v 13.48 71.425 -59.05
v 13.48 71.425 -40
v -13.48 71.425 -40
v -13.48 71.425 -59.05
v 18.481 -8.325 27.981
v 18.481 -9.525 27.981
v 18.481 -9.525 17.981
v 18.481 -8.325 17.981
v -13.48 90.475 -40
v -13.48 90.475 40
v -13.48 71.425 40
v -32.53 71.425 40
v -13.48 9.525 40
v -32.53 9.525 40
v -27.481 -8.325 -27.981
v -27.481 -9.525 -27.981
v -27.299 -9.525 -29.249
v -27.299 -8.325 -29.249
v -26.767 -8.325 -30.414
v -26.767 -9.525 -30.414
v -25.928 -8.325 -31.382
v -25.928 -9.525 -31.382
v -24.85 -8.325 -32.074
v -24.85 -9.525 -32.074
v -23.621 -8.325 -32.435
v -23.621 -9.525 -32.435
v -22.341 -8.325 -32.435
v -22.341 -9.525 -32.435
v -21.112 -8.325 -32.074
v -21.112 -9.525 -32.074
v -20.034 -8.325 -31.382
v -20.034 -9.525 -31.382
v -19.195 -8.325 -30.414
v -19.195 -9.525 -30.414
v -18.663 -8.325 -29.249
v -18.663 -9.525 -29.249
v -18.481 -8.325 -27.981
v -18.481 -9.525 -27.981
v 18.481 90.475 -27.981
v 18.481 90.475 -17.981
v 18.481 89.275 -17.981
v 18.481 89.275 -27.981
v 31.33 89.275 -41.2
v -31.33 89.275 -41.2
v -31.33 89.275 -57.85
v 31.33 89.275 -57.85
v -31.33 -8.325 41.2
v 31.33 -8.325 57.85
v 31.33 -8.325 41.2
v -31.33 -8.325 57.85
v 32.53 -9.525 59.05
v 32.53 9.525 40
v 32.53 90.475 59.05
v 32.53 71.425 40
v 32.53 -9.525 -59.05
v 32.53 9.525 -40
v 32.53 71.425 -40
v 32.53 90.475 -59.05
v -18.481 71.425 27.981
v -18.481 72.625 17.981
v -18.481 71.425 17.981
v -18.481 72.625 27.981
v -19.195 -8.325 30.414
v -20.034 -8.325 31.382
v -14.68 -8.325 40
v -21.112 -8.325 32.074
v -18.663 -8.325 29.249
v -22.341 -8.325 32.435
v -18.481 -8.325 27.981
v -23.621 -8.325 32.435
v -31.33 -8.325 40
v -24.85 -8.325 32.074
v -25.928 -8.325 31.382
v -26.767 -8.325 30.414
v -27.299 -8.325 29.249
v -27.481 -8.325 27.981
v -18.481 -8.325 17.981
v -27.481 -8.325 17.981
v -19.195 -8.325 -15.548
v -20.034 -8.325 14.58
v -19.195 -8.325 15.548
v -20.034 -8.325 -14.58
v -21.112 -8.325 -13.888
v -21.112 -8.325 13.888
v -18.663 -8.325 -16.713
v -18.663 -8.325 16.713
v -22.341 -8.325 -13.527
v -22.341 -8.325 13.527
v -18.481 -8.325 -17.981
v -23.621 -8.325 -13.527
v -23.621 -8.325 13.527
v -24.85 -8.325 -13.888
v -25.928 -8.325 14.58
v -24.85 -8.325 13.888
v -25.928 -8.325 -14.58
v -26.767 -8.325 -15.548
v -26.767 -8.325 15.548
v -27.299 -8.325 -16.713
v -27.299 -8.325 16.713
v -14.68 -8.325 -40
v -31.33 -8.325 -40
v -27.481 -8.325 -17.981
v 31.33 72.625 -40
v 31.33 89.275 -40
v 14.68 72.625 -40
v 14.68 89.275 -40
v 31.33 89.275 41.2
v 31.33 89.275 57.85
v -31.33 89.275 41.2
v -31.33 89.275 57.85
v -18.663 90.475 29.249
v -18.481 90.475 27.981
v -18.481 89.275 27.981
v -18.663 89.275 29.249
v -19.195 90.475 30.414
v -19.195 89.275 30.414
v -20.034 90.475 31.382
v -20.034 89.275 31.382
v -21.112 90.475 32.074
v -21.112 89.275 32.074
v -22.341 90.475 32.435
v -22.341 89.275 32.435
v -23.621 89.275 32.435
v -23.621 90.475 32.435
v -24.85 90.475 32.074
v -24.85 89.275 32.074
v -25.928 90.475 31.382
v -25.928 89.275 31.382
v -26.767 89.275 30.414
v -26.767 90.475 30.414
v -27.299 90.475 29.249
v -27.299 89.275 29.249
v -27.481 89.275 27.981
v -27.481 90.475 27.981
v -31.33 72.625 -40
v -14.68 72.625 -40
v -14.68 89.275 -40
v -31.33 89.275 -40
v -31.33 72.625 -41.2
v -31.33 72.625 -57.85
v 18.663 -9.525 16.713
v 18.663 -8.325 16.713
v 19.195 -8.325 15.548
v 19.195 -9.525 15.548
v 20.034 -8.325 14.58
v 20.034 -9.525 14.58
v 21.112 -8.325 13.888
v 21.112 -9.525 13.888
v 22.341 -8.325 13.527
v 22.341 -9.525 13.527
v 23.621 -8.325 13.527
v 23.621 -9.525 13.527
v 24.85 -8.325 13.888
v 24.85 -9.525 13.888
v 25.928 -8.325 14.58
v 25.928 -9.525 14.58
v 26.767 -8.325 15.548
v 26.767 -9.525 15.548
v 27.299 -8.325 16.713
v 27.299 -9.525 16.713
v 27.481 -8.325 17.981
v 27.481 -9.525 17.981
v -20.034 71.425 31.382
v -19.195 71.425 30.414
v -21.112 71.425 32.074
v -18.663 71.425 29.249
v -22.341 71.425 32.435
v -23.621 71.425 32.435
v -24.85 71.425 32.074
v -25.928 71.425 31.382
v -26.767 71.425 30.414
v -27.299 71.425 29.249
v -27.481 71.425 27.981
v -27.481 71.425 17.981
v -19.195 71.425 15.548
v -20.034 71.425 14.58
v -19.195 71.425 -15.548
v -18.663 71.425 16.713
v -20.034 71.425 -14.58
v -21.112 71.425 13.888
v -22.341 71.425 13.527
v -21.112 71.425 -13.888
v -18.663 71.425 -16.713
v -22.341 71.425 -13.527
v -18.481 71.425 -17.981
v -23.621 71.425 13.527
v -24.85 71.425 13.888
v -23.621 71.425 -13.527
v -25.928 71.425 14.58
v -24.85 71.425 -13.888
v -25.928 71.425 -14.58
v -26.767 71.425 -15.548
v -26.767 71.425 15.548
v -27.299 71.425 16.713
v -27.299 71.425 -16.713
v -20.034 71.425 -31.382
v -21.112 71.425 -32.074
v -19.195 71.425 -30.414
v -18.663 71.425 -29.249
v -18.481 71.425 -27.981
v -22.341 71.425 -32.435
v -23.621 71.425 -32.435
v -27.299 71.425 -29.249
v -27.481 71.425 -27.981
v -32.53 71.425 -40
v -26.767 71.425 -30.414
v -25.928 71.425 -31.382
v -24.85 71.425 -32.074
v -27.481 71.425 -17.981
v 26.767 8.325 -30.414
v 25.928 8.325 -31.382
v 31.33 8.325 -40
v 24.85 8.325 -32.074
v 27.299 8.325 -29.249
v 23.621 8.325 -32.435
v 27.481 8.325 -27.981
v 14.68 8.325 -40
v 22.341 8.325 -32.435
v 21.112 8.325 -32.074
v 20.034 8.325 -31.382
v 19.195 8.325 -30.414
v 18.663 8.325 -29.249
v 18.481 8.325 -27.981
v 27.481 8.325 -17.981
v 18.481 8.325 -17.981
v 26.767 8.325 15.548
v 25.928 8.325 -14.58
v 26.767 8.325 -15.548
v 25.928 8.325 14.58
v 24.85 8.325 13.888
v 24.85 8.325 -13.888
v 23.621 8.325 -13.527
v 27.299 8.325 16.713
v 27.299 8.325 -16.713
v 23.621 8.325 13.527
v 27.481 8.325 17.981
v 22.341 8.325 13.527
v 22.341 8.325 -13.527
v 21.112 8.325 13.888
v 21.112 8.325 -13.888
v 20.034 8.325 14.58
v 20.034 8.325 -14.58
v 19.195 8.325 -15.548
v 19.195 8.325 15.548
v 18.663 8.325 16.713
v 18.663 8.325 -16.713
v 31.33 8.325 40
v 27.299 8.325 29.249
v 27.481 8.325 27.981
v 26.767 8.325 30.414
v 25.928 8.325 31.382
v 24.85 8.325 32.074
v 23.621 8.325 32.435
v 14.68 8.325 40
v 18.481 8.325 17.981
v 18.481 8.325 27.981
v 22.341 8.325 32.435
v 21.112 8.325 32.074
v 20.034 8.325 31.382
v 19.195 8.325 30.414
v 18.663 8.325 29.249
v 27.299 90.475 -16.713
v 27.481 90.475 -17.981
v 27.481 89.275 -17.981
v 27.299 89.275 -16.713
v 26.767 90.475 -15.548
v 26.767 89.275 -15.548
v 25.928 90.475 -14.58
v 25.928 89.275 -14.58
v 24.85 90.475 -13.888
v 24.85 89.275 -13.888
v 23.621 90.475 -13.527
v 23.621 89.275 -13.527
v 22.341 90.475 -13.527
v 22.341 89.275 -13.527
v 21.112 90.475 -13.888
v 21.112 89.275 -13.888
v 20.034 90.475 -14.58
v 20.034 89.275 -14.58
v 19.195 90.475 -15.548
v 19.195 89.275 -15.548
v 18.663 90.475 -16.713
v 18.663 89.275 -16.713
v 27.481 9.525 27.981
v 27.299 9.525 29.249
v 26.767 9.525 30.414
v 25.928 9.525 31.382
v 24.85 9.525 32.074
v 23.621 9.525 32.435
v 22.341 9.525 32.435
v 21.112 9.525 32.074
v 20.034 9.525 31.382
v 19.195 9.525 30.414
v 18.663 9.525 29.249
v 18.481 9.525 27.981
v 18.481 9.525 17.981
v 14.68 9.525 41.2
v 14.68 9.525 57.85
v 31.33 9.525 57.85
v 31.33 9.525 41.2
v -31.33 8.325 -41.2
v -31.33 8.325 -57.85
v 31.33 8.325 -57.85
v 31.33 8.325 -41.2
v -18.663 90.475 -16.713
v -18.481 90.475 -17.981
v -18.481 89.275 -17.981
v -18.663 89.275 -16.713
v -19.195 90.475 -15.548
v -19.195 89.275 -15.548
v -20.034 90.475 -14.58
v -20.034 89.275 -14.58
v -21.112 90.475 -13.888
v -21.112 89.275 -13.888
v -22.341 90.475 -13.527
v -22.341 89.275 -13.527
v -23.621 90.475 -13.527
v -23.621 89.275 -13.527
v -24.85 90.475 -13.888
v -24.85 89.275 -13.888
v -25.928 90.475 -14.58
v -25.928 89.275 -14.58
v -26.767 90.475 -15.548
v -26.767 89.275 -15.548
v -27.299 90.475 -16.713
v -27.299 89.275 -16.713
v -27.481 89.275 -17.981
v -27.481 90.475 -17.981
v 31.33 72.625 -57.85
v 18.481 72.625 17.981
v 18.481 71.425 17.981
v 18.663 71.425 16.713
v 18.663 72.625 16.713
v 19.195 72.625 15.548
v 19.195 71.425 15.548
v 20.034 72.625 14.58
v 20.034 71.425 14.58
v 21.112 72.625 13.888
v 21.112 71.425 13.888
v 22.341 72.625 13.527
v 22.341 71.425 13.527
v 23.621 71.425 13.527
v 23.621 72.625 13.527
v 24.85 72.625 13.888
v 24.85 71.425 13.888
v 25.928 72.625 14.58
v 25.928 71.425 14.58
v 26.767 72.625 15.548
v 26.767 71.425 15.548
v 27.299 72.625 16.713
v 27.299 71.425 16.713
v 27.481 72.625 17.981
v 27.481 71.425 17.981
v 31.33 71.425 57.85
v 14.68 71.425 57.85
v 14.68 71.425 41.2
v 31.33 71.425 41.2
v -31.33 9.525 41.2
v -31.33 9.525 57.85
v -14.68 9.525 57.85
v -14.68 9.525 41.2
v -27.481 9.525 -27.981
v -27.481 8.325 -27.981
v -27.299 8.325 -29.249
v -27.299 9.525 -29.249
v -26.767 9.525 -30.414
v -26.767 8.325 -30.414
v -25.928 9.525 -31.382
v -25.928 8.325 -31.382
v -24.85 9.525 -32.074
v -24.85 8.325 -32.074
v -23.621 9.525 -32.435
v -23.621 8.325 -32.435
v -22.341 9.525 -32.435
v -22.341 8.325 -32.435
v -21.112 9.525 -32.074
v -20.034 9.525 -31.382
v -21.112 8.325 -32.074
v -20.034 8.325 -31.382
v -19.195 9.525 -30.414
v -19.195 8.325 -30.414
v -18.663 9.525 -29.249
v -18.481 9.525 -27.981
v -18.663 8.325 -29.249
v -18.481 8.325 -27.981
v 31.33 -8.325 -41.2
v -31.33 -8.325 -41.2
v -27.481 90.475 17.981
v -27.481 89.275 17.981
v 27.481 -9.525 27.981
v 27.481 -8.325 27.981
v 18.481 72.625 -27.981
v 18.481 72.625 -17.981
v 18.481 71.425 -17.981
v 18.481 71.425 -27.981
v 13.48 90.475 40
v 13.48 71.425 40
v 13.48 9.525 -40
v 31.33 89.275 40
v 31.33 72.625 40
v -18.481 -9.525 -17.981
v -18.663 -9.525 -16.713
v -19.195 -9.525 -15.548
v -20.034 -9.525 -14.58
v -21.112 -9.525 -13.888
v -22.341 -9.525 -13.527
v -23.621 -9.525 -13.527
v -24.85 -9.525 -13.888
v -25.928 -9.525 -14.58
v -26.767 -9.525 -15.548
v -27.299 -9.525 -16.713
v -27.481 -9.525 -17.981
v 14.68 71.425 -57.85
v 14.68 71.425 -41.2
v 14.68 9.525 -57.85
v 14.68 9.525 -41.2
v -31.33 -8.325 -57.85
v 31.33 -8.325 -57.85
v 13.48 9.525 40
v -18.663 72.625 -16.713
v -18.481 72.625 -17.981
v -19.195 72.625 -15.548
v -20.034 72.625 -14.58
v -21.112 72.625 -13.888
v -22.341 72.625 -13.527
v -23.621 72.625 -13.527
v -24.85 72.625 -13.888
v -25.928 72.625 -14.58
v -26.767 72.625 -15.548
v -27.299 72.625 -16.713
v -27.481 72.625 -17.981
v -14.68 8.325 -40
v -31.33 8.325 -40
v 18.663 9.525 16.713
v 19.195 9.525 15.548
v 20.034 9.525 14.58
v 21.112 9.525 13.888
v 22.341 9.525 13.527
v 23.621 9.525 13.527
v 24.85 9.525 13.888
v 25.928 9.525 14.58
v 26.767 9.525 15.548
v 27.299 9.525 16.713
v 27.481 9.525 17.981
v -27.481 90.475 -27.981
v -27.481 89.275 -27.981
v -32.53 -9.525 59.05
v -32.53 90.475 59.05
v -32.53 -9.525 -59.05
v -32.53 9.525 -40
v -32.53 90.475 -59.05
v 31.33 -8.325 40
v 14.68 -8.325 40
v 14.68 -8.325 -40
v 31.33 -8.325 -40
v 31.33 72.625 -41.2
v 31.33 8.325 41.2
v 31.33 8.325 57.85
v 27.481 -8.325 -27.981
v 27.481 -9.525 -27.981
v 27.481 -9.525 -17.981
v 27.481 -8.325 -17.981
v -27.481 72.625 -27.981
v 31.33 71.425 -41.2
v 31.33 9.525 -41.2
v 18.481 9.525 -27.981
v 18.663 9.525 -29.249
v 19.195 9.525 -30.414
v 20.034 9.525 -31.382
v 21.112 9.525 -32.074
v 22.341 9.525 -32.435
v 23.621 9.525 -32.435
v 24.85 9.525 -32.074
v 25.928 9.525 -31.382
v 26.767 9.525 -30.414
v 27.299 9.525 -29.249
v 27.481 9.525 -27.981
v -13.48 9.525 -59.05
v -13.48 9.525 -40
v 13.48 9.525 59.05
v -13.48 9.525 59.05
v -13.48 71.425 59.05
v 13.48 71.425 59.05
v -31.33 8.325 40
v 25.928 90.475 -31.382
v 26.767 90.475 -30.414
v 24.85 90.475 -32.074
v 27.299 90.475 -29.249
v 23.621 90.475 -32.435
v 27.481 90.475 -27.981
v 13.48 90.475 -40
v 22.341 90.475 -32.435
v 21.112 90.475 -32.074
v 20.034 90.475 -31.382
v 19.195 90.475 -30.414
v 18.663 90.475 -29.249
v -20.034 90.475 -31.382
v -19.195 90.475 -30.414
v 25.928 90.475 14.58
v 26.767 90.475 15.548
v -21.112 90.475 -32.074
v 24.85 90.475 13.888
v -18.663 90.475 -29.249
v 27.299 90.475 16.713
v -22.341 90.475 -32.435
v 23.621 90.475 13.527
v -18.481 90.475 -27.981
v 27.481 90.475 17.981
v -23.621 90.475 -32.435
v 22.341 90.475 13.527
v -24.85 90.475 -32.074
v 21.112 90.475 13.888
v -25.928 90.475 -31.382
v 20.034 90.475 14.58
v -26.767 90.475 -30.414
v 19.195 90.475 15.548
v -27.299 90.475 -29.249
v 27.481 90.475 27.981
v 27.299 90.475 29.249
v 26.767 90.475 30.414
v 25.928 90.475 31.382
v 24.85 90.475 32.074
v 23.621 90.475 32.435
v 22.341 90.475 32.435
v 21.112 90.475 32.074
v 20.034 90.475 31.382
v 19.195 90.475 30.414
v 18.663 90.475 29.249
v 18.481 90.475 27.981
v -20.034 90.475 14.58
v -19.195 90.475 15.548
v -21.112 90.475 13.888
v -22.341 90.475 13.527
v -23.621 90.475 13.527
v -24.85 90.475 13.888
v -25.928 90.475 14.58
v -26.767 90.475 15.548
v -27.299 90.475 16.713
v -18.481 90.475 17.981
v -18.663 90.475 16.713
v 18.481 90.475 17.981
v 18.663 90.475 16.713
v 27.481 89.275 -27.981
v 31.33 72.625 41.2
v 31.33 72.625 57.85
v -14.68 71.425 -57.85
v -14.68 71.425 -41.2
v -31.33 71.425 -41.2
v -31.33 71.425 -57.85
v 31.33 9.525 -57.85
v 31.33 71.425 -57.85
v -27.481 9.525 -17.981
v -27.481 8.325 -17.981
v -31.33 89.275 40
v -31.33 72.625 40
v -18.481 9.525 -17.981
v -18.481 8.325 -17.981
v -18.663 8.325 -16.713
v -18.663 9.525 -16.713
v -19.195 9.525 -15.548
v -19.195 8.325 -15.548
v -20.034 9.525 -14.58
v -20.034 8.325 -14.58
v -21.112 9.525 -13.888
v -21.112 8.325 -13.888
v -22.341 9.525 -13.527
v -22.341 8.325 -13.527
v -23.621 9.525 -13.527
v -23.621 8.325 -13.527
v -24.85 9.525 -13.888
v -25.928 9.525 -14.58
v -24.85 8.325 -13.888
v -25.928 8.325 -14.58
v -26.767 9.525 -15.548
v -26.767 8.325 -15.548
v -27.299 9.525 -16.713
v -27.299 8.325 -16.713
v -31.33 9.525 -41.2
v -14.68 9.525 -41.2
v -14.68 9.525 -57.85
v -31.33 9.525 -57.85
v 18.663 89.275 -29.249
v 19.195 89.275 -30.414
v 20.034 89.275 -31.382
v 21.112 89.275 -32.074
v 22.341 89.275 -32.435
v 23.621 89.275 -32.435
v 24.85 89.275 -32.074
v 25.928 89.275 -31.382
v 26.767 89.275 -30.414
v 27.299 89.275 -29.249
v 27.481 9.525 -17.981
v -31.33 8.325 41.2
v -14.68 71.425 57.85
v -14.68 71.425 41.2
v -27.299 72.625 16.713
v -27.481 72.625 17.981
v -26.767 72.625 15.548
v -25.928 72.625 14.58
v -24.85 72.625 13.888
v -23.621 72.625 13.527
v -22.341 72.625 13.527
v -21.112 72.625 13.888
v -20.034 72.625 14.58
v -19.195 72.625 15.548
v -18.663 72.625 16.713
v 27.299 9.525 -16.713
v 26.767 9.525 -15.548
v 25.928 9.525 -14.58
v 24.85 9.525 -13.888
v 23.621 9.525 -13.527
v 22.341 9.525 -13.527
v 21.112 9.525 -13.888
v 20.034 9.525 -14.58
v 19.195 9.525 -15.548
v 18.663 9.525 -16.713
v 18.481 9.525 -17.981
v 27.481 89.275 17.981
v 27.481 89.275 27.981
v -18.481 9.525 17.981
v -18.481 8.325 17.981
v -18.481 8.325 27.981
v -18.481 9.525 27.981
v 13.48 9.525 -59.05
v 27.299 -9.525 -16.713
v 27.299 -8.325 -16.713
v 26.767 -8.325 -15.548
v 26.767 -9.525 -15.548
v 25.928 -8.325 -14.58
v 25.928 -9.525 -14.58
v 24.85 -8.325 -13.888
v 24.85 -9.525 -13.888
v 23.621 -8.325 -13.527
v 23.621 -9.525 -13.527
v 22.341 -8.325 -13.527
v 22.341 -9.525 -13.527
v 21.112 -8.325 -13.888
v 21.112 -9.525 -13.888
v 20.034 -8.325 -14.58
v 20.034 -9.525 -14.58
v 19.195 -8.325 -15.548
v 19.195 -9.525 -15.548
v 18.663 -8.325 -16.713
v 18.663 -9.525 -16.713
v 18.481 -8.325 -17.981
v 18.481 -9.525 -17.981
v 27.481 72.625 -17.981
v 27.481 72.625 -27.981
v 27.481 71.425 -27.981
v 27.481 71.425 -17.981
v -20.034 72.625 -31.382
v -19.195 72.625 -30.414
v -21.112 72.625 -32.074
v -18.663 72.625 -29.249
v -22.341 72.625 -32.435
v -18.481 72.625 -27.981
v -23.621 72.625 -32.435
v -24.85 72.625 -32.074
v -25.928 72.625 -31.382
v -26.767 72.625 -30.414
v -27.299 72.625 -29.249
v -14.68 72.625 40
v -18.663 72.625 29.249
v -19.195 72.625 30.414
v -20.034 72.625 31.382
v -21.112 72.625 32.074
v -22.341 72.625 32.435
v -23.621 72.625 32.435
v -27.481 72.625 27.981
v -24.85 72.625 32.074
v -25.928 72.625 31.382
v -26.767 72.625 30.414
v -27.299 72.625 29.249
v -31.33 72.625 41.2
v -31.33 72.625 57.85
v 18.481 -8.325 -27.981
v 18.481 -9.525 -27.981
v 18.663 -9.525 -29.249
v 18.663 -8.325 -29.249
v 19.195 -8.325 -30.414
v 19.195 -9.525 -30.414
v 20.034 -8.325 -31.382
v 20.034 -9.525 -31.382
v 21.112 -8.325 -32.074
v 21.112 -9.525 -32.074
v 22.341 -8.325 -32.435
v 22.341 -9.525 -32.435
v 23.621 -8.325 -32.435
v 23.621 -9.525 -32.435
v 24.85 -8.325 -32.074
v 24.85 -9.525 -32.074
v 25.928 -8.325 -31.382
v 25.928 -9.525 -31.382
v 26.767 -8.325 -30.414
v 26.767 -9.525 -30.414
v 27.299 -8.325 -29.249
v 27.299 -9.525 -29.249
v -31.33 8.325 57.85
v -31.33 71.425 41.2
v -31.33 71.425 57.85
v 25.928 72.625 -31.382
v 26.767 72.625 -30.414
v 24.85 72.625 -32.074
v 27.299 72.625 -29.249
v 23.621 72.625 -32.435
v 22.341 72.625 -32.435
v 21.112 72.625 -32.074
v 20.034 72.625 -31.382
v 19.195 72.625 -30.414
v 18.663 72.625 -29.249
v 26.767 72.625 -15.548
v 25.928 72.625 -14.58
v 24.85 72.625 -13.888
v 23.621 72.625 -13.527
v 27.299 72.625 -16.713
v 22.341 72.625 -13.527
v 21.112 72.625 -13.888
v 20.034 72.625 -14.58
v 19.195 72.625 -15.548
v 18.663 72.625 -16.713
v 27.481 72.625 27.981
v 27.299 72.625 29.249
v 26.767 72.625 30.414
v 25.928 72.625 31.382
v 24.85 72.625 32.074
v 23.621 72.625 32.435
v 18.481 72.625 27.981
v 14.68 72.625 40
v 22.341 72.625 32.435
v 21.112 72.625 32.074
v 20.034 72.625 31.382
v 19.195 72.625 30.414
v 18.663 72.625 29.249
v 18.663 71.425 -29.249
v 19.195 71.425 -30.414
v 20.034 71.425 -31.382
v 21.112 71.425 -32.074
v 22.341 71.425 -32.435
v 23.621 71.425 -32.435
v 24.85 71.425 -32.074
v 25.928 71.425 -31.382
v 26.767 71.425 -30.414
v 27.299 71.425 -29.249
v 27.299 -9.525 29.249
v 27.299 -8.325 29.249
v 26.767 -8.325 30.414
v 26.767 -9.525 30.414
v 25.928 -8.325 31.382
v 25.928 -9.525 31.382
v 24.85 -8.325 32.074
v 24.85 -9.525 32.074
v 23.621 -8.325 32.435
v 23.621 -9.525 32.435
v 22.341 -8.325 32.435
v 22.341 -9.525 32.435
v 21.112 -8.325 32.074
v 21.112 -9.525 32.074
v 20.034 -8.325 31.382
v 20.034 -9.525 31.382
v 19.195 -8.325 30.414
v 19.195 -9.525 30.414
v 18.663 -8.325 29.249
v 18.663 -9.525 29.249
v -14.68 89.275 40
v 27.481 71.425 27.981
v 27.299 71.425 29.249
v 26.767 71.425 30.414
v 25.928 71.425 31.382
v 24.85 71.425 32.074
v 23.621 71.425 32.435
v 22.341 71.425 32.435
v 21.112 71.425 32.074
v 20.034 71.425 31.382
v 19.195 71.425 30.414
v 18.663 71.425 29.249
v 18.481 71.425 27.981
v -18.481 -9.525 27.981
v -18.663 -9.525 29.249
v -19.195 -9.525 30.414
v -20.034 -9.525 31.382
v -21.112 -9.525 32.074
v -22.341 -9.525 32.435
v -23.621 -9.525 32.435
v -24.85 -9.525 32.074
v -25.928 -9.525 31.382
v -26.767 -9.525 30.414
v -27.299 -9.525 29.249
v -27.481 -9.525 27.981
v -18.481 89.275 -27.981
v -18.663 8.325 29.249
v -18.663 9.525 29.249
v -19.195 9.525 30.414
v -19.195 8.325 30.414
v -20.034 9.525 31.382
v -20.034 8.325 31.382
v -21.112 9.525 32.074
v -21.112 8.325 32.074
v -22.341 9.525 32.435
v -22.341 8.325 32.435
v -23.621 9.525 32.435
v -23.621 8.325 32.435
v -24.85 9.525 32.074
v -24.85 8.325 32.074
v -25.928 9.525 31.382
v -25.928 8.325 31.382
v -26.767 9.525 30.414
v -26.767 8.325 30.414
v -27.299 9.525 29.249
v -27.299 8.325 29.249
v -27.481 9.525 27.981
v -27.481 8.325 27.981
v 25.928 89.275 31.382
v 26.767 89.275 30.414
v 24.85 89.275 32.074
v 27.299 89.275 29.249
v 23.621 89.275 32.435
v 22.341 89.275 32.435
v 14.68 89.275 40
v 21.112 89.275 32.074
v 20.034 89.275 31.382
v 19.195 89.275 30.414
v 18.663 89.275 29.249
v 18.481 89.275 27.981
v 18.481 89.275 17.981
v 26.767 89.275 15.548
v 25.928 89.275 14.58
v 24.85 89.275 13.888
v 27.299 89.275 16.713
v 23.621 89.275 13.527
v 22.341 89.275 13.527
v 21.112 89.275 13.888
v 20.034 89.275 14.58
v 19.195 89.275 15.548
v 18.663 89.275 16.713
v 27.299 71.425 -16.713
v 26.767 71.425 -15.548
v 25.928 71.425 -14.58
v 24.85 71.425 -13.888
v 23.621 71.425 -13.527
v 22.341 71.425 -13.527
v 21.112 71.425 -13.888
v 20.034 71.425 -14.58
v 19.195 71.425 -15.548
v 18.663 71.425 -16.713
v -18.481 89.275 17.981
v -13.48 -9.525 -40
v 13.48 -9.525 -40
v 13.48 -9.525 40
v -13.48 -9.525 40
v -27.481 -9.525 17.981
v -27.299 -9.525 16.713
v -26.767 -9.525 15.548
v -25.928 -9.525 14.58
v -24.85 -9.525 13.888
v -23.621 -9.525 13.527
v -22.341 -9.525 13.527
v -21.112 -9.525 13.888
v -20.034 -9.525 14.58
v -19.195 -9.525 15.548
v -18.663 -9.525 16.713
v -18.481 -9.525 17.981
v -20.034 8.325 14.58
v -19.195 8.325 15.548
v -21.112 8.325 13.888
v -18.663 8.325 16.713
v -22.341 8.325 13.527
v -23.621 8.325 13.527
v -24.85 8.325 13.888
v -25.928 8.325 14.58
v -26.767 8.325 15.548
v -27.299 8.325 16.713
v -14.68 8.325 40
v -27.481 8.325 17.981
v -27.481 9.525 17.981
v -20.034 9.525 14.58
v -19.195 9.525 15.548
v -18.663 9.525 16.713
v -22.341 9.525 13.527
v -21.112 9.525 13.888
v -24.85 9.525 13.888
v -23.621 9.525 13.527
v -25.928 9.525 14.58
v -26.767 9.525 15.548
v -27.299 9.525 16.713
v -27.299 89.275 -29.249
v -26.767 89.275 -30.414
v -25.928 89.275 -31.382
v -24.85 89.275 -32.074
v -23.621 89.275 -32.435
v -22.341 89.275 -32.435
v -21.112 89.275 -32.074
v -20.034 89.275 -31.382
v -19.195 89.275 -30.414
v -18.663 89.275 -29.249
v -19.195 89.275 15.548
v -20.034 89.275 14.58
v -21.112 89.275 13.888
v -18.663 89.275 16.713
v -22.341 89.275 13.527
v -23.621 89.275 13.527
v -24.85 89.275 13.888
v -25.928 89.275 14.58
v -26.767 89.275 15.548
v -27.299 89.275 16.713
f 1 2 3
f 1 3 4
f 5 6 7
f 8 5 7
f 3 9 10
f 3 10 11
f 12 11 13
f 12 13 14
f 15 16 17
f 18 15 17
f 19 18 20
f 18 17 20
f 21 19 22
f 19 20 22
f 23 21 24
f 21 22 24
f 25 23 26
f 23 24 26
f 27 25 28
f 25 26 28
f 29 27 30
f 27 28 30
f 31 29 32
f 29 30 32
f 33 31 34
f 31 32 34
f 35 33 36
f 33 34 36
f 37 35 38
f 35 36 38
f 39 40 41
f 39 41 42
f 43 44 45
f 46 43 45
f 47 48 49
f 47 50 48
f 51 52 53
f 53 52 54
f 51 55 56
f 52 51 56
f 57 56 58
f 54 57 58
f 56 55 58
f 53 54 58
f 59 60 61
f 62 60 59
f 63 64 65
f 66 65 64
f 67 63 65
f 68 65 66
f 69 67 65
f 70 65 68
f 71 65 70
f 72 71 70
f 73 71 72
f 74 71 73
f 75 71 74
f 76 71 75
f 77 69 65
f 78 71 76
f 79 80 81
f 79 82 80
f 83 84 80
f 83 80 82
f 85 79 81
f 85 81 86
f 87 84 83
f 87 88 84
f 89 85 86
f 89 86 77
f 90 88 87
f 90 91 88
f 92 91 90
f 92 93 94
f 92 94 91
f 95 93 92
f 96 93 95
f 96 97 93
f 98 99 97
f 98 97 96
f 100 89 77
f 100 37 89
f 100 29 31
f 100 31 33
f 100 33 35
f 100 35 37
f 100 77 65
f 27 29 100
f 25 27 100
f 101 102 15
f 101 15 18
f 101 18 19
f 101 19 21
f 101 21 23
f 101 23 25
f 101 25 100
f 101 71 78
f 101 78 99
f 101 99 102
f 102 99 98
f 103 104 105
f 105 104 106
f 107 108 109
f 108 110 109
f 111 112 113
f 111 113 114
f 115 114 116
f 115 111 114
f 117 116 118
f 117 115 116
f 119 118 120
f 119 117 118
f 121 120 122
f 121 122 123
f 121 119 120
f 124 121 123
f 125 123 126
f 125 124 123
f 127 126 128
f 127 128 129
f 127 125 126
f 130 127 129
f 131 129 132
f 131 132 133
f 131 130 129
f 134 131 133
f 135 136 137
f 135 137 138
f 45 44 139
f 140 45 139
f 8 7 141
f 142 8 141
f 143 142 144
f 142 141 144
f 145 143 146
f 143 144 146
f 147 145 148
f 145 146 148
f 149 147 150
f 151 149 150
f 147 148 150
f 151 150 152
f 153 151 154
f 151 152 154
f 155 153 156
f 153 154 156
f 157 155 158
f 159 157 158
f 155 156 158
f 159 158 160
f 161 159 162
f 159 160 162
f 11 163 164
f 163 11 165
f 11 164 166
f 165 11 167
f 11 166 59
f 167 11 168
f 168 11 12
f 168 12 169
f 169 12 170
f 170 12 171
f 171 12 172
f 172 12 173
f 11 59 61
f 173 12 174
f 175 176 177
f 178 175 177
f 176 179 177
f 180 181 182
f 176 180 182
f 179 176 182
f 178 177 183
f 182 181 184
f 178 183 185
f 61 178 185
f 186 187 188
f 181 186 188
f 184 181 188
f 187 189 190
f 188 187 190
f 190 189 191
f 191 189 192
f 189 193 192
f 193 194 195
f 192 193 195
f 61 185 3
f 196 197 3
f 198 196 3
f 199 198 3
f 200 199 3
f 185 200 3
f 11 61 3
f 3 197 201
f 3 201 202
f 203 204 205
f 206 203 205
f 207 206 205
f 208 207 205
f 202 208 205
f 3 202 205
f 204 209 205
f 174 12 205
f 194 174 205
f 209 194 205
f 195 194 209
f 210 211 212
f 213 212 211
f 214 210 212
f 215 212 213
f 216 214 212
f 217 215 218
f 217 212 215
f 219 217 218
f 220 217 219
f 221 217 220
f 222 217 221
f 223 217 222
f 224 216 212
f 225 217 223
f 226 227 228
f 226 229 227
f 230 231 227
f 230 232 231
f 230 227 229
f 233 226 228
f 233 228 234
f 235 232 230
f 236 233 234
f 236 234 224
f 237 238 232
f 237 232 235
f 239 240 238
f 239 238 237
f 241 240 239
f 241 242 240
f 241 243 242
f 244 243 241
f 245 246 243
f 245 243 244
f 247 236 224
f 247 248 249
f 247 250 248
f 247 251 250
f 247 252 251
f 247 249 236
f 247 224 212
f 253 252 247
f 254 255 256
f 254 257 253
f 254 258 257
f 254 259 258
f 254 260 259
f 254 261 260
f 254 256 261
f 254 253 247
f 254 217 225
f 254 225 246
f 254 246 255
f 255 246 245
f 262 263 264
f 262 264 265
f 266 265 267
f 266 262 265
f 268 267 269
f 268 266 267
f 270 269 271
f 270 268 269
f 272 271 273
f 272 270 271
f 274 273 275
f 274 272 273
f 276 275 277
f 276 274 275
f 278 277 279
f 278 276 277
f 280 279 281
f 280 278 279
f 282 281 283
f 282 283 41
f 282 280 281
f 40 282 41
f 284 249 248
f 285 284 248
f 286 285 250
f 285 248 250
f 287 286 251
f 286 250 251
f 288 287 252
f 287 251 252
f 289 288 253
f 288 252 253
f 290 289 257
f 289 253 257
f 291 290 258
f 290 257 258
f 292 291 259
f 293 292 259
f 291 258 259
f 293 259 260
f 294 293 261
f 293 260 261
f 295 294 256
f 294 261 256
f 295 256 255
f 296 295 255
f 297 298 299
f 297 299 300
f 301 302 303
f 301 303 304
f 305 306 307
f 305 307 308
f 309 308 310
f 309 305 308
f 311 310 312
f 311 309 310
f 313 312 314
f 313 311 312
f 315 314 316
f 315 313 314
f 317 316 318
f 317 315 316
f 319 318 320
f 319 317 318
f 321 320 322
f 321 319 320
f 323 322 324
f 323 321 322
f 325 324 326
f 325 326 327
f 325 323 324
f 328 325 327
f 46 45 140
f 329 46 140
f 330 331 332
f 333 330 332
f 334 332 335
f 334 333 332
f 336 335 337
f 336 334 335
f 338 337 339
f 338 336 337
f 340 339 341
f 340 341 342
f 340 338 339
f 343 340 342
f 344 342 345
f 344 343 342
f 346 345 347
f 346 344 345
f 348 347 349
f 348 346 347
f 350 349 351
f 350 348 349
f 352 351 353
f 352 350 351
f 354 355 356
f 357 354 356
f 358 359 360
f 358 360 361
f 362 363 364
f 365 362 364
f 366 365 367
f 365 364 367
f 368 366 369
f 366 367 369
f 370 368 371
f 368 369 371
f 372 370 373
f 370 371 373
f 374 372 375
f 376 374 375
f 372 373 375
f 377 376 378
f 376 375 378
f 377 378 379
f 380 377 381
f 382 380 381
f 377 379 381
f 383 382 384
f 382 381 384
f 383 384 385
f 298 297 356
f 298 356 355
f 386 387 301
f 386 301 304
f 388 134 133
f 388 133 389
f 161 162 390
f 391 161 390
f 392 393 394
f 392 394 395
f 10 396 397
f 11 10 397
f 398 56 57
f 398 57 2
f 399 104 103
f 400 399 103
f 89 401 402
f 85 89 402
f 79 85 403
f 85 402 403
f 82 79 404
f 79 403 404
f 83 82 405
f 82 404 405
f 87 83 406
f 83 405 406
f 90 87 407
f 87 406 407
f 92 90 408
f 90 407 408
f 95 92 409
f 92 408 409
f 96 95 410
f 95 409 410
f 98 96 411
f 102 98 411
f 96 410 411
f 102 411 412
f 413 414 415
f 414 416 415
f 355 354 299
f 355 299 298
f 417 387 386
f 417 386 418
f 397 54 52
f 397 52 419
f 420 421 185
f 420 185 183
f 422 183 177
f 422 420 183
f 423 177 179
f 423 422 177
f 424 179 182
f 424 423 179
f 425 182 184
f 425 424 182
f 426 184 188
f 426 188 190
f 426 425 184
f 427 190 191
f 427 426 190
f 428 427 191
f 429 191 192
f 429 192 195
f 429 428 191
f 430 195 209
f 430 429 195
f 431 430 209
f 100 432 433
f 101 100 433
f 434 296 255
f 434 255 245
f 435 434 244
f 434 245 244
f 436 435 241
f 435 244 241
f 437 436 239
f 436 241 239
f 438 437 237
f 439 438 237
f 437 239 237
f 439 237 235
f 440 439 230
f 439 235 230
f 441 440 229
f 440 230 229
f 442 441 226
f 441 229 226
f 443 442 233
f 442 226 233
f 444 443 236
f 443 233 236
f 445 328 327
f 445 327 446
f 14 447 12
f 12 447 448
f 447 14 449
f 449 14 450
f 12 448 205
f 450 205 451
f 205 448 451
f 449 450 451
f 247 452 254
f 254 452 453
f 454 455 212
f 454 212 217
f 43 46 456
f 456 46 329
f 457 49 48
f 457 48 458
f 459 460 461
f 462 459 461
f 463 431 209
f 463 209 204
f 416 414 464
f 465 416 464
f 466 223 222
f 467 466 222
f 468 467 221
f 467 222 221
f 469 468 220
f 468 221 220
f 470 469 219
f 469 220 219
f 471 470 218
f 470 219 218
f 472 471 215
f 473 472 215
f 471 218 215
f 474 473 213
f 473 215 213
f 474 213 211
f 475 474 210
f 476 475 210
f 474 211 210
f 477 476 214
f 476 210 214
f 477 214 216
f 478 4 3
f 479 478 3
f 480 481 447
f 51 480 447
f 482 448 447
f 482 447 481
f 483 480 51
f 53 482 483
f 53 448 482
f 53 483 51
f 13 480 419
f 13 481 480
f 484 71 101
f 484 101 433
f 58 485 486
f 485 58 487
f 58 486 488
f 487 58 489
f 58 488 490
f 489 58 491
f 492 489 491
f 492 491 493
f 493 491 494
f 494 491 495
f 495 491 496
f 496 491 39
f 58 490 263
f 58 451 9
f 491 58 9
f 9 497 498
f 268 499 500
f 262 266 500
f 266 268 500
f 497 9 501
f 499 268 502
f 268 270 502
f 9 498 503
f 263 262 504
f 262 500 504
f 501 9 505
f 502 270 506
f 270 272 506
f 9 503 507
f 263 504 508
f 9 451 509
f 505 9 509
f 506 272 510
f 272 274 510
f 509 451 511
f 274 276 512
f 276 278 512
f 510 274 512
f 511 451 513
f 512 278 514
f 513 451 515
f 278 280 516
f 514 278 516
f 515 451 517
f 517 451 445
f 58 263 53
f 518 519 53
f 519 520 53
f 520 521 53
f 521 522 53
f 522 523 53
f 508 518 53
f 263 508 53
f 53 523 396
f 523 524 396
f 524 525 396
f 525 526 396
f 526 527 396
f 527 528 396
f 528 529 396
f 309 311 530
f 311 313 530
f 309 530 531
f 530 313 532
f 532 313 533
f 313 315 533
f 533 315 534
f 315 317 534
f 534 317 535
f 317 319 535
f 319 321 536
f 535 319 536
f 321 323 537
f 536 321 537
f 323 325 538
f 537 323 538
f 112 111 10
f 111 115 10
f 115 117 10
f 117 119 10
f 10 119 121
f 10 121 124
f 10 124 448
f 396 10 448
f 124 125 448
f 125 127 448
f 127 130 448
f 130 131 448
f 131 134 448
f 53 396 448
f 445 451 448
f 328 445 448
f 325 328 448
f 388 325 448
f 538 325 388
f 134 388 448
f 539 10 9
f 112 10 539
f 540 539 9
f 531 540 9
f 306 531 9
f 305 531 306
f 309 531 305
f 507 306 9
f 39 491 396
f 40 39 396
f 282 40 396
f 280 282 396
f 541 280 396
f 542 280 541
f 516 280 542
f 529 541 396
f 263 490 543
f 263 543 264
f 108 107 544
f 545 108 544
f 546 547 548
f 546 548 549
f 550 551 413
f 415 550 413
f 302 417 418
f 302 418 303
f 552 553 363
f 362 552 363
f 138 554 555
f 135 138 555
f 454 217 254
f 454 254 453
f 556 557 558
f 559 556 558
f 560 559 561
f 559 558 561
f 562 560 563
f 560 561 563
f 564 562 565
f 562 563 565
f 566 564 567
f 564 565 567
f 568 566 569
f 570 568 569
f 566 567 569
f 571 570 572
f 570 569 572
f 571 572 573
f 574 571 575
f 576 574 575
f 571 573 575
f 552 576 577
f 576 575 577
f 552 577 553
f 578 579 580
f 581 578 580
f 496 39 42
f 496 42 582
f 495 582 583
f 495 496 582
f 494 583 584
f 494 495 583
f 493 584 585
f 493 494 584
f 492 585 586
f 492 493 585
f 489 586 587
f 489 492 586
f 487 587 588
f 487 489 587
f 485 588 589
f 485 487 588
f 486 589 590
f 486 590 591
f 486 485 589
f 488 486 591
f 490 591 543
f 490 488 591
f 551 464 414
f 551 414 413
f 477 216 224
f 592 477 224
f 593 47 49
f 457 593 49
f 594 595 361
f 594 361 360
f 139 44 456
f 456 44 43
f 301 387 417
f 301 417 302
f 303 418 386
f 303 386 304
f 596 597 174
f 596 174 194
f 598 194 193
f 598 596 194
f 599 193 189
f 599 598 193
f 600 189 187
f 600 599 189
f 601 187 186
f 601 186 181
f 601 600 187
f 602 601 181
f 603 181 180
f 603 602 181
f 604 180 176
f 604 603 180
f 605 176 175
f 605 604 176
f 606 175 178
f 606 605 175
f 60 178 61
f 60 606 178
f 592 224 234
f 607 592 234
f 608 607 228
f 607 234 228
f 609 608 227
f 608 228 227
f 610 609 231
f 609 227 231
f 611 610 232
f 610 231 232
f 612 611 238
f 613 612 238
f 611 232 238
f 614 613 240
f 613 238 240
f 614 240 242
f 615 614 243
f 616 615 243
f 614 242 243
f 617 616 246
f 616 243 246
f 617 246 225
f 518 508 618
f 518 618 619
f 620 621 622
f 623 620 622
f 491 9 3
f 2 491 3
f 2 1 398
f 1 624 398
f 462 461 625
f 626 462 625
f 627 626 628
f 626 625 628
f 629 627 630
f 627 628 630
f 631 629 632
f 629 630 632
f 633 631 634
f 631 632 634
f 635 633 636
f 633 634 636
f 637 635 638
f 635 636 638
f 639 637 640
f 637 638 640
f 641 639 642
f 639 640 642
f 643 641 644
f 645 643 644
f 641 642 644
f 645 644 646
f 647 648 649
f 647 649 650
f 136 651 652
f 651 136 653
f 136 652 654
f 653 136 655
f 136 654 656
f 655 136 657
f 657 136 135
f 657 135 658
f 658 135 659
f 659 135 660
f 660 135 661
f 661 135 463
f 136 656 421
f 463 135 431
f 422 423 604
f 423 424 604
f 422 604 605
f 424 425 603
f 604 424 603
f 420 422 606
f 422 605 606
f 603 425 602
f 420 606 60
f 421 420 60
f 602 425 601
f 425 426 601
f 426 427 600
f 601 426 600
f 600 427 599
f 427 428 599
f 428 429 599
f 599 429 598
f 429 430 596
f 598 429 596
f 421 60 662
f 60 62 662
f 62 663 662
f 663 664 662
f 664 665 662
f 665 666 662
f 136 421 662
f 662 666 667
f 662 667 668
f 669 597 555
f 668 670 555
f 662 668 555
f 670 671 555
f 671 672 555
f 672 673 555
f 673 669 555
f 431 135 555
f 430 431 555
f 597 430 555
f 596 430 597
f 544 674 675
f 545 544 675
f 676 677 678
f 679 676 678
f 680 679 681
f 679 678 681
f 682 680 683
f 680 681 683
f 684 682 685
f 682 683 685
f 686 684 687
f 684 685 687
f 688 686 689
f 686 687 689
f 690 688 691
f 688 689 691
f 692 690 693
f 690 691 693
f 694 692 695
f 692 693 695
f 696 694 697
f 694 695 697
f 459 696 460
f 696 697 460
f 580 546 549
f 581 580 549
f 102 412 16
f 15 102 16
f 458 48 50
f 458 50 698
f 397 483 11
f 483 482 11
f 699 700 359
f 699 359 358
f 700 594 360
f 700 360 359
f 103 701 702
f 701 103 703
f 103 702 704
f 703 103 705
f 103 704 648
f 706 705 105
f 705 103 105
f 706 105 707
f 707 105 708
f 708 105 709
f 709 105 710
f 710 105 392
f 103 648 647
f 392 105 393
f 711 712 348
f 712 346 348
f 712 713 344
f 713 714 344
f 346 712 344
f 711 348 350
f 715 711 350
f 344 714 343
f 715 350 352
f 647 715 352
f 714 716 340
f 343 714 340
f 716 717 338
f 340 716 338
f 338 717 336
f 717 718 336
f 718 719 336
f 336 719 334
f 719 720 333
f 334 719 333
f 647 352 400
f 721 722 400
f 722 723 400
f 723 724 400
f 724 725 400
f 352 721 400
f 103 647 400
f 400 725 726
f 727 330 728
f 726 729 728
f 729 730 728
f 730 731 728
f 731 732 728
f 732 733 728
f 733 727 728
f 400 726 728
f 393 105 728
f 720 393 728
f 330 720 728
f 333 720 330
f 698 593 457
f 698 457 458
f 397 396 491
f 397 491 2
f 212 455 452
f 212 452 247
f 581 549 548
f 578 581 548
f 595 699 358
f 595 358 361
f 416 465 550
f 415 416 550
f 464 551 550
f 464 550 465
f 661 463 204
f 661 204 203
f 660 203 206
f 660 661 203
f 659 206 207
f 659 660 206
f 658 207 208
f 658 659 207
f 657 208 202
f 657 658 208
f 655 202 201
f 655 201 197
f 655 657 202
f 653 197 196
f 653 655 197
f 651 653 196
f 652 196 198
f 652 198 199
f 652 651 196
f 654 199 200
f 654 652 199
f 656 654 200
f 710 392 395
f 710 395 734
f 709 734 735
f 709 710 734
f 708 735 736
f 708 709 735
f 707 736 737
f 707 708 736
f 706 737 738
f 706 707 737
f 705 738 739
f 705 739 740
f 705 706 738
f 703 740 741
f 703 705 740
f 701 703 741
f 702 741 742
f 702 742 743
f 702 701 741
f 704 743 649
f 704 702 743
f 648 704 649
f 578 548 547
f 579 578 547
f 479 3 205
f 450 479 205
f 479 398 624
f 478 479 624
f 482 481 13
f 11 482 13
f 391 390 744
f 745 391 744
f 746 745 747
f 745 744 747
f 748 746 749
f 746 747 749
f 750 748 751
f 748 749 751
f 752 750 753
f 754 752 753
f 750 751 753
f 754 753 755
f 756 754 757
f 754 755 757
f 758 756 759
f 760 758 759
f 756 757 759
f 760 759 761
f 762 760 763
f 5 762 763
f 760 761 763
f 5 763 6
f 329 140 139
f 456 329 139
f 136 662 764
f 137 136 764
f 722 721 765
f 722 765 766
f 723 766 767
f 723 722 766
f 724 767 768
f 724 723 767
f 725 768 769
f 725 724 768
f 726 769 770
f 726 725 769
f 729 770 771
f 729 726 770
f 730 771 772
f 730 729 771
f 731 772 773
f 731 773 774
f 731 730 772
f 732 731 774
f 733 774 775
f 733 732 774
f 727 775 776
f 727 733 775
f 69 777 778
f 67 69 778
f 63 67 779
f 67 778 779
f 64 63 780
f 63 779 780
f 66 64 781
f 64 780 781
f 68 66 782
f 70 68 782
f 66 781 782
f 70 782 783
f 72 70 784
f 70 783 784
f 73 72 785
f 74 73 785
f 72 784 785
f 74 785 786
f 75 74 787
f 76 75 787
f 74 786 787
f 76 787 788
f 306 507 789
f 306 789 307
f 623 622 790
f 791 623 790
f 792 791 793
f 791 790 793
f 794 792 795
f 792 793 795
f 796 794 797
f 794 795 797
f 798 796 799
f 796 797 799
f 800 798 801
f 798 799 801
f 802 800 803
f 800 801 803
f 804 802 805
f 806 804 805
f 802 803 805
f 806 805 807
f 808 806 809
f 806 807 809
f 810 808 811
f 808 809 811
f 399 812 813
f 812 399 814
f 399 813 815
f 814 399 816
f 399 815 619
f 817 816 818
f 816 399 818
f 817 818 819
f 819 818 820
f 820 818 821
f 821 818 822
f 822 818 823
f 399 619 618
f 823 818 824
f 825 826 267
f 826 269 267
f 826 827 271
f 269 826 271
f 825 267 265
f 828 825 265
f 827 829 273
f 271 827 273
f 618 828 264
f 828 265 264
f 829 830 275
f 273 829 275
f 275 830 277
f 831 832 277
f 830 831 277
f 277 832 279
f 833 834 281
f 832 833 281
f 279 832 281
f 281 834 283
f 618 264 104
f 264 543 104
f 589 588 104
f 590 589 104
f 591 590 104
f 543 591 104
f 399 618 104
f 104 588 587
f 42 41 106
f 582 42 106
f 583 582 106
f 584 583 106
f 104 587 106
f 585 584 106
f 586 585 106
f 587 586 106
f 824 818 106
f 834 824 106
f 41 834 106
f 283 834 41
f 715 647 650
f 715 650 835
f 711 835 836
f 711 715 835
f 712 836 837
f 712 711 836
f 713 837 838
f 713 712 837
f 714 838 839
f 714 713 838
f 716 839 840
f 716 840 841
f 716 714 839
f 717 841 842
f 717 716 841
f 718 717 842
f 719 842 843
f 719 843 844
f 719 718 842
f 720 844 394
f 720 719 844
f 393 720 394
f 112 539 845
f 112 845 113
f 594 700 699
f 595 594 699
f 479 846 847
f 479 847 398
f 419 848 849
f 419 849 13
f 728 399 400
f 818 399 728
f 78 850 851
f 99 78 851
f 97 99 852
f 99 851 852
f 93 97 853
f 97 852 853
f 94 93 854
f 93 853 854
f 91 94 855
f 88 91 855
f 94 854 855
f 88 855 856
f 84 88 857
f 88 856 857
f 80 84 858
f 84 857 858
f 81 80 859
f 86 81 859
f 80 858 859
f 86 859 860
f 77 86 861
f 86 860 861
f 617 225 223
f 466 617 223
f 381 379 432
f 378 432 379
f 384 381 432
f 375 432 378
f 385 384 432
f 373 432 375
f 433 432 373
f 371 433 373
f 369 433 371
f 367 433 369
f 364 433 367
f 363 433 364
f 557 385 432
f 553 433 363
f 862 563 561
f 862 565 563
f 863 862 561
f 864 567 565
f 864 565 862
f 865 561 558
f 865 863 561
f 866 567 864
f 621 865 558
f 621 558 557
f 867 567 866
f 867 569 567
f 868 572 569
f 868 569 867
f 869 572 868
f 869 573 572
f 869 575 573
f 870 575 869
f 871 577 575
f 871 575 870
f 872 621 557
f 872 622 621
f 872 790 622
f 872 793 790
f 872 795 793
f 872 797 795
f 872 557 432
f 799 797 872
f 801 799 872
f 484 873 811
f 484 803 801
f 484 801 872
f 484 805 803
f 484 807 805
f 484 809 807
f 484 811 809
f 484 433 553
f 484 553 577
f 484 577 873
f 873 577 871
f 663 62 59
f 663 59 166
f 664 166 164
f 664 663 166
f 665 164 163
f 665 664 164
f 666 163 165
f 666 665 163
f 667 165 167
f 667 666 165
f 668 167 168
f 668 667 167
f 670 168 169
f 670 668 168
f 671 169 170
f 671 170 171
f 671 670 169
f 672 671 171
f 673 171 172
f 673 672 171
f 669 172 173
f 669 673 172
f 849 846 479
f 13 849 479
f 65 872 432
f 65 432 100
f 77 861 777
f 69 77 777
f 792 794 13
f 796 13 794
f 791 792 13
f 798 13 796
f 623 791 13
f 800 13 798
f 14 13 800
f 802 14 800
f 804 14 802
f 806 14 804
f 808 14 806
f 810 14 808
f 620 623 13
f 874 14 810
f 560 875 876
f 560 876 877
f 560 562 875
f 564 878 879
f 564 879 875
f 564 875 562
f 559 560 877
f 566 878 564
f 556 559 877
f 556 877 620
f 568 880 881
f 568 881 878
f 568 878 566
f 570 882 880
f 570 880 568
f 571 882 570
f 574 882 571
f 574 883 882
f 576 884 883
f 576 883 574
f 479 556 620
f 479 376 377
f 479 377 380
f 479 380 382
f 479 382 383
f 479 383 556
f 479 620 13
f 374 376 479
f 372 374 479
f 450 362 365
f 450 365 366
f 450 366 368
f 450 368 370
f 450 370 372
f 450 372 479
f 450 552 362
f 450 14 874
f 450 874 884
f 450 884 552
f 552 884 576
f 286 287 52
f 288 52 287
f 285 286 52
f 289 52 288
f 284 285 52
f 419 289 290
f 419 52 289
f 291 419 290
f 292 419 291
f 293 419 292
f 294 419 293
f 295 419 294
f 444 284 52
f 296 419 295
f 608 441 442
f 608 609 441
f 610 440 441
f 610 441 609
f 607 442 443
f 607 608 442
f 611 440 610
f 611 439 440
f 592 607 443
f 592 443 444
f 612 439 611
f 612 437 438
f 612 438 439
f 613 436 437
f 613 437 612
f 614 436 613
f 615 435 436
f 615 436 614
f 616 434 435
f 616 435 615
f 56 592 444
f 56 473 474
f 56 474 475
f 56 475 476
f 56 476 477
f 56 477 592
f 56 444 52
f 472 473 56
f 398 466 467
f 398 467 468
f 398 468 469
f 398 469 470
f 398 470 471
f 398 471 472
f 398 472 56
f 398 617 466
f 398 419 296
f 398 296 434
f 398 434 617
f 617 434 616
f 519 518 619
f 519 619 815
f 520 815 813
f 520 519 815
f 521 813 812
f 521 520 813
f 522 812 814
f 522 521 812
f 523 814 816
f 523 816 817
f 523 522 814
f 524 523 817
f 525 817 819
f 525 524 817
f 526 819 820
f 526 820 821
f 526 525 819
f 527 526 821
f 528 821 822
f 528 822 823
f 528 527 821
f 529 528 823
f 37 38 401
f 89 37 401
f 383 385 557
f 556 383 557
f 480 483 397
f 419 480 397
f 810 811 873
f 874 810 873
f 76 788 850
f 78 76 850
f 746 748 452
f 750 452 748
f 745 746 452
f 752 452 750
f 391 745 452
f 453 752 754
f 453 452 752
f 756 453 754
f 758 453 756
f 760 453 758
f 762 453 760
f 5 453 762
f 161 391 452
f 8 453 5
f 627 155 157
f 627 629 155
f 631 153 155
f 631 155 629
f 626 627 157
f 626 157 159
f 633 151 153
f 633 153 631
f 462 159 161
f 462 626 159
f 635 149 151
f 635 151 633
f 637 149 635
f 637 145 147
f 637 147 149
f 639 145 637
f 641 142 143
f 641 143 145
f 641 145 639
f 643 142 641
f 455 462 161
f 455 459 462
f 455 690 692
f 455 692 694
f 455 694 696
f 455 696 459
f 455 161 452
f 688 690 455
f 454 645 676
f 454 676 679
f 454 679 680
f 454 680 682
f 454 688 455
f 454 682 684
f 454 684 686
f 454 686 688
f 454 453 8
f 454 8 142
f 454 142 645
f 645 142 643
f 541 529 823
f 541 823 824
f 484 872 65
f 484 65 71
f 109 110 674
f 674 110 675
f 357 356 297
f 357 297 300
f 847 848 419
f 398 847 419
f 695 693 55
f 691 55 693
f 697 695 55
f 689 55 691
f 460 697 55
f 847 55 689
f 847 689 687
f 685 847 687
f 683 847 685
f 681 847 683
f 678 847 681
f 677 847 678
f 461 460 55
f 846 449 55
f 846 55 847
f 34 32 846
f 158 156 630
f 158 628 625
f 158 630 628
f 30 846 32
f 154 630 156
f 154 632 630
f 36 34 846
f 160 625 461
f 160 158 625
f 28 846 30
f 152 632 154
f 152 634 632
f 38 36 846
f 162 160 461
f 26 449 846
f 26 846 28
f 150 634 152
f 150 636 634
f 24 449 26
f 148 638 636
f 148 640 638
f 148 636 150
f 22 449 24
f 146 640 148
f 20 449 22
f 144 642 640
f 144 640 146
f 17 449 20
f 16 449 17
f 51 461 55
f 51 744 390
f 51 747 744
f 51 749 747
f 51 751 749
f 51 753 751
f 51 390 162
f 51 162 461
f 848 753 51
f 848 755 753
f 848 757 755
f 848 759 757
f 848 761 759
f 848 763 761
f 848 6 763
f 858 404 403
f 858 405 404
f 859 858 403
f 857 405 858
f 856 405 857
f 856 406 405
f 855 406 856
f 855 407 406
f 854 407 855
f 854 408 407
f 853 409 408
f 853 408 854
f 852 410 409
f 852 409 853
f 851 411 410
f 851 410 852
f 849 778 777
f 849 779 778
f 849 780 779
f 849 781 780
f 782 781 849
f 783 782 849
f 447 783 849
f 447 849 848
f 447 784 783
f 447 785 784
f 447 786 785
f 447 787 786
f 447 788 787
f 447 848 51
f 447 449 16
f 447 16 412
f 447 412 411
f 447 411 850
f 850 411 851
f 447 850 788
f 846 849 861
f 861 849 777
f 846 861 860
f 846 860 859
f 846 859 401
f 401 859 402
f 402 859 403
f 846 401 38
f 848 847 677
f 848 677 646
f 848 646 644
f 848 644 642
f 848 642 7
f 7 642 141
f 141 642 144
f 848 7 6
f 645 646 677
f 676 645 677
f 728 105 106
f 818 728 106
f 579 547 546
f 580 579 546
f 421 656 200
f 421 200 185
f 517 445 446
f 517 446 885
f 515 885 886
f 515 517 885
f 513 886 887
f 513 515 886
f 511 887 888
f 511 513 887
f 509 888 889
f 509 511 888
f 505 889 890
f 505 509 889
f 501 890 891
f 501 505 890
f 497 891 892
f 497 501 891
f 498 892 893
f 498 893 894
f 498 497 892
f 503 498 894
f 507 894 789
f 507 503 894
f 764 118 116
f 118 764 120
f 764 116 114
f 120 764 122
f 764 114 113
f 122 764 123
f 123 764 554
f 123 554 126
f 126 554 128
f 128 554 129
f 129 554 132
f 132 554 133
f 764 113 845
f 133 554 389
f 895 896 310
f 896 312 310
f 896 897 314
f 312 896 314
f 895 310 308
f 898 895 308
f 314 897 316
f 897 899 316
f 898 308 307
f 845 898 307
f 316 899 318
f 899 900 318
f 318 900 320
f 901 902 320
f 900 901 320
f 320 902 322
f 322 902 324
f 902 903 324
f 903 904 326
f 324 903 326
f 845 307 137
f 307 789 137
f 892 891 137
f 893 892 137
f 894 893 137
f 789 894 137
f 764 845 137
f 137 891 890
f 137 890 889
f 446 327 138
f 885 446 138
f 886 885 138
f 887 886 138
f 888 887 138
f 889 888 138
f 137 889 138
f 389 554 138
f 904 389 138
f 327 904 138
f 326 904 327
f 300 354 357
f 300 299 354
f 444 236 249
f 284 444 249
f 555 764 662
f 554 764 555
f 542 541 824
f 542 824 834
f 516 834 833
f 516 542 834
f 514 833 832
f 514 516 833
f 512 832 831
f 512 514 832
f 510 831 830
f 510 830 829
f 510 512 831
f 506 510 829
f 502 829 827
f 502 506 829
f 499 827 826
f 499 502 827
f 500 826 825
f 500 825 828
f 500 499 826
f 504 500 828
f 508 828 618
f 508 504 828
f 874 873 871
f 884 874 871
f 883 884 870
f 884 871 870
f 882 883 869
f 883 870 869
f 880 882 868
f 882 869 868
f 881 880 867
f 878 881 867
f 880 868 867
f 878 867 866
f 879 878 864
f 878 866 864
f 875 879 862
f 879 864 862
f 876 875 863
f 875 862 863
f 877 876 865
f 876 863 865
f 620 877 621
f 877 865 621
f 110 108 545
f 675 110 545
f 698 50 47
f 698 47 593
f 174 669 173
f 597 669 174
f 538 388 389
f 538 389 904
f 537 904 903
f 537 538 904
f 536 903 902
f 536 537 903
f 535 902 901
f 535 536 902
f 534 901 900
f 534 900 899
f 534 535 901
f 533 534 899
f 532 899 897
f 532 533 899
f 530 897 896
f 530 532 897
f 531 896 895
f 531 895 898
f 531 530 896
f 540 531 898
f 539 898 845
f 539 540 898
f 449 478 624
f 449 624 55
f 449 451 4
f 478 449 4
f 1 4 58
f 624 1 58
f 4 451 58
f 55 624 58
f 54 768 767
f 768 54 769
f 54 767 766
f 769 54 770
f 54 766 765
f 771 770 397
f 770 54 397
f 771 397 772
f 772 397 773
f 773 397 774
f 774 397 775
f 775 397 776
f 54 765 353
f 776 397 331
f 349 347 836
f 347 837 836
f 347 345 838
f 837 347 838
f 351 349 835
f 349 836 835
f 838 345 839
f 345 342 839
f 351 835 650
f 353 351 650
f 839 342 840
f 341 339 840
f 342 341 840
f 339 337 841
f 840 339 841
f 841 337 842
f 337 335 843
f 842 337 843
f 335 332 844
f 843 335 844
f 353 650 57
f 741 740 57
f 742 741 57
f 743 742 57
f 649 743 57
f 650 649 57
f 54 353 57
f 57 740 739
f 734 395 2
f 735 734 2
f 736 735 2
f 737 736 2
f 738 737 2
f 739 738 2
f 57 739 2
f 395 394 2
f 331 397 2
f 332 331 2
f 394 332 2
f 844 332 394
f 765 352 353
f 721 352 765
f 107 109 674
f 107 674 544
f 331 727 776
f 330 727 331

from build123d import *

# Parameters (mm, degrees)
SKETCH2_W          = 19.05
SKETCH2_H          = 19.05
SKETCH2_W_2        = 16.65
SKETCH2_H_2        = 16.65
CUT_EXTRUDE1_START = -9.525
SKETCH1_3_W        = 26.96
SKETCH1_3_H        = 80
CUT_EXTRUDE1_DEPTH = 19.05
SKETCH4_W          = 19.05
SKETCH4_H          = 19.05
SKETCH4_W_2        = 16.65
SKETCH4_H_2        = 16.65


with BuildPart() as part:
    # Sweep1: sweep along a path in Sketch1
    with BuildLine(Plane(origin=(0, 0, 0), x_dir=(1, 0, 0), z_dir=(0, 1, 0))) as sweep1_path:
        Line((13.48, 40), (-13.48, 40))
        Line((-13.48, 40), (-13.48, -40))
        Line((-13.48, -40), (13.48, -40))
        Line((13.48, -40), (13.48, 40))
    # Sketch2 → Sweep1 (sweep)
    with BuildSketch(Plane.XY):
        with Locations((-23.005, 0)):
            Rectangle(SKETCH2_W, SKETCH2_H)
        with Locations((-23.005, 0)):
            Rectangle(SKETCH2_W_2, SKETCH2_H_2, mode=Mode.SUBTRACT)
    sweep(path=sweep1_path.line, transition=Transition.RIGHT)

    # Sketch1<3> → Cut-Extrude1 (cut)
    with BuildSketch(Plane(origin=(0, 0, 0), x_dir=(1, 0, 0), z_dir=(0, 1, 0)).offset(CUT_EXTRUDE1_START)):
        Rectangle(SKETCH1_3_W, SKETCH1_3_H)
        with BuildLine():
            Line((-18.480970389, 27.980970389), (-18.480970389, 17.980970389))
            ThreePointArc((-18.480970389, 17.980970389), (-22.980970389, 13.480970389), (-27.480970389, 17.980970389))
            Line((-27.480970389, 17.980970389), (-27.480970389, 27.980970389))
            ThreePointArc((-27.480970389, 27.980970389), (-22.980970389, 32.480970389), (-18.480970389, 27.980970389))
        make_face()
        with BuildLine():
            Line((-18.480970389, -17.980970389), (-18.480970389, -27.980970389))
            ThreePointArc((-18.480970389, -27.980970389), (-22.980970389, -32.480970389), (-27.480970389, -27.980970389))
            Line((-27.480970389, -27.980970389), (-27.480970389, -17.980970389))
            ThreePointArc((-27.480970389, -17.980970389), (-22.980970389, -13.480970389), (-18.480970389, -17.980970389))
        make_face()
        with BuildLine():
            Line((27.480970389, 27.980970389), (27.480970389, 17.980970389))
            ThreePointArc((27.480970389, 17.980970389), (22.980970389, 13.480970389), (18.480970389, 17.980970389))
            Line((18.480970389, 17.980970389), (18.480970389, 27.980970389))
            ThreePointArc((18.480970389, 27.980970389), (22.980970389, 32.480970389), (27.480970389, 27.980970389))
        make_face()
        with BuildLine():
            Line((18.480970389, -27.980970389), (18.480970389, -17.980970389))
            ThreePointArc((18.480970389, -17.980970389), (22.980970389, -13.480970389), (27.480970389, -17.980970389))
            Line((27.480970389, -17.980970389), (27.480970389, -27.980970389))
            ThreePointArc((27.480970389, -27.980970389), (22.980970389, -32.480970389), (18.480970389, -27.980970389))
        make_face()
    extrude(amount=CUT_EXTRUDE1_DEPTH, mode=Mode.SUBTRACT)

    # Sweep2: sweep along a path in Sketch3
    with BuildLine(Plane(origin=(0, 0, 40), x_dir=(-1, 0, 0), z_dir=(0, 0, -1))) as sweep2_path:
        Line((13.48, 40.475), (13.48, 9.525))
        Line((13.48, 9.525), (-13.48, 9.525))
        Line((-13.48, 9.525), (-13.48, 40.475))
    # Sketch4 → Sweep2 (sweep)
    with BuildSketch(Plane(origin=(0, 9.525, 0), x_dir=(1, 0, 0), z_dir=(0, 1, 0))):
        with Locations((-23.005, -49.525)):
            Rectangle(SKETCH4_W, SKETCH4_H)
        with Locations((-23.005, -49.525)):
            Rectangle(SKETCH4_W_2, SKETCH4_H_2, mode=Mode.SUBTRACT)
    sweep2 = sweep(path=sweep2_path.line, transition=Transition.RIGHT)

    # Mirror1: Sweep2 across plane
    add(sweep2.mirror(Plane.XY))

    # Mirror3: part across plane


with BuildPart() as part_1:
    add(part.part)
    add(part.part.mirror(Plane.ZX.offset(40.475)))


solid = part_1.part
